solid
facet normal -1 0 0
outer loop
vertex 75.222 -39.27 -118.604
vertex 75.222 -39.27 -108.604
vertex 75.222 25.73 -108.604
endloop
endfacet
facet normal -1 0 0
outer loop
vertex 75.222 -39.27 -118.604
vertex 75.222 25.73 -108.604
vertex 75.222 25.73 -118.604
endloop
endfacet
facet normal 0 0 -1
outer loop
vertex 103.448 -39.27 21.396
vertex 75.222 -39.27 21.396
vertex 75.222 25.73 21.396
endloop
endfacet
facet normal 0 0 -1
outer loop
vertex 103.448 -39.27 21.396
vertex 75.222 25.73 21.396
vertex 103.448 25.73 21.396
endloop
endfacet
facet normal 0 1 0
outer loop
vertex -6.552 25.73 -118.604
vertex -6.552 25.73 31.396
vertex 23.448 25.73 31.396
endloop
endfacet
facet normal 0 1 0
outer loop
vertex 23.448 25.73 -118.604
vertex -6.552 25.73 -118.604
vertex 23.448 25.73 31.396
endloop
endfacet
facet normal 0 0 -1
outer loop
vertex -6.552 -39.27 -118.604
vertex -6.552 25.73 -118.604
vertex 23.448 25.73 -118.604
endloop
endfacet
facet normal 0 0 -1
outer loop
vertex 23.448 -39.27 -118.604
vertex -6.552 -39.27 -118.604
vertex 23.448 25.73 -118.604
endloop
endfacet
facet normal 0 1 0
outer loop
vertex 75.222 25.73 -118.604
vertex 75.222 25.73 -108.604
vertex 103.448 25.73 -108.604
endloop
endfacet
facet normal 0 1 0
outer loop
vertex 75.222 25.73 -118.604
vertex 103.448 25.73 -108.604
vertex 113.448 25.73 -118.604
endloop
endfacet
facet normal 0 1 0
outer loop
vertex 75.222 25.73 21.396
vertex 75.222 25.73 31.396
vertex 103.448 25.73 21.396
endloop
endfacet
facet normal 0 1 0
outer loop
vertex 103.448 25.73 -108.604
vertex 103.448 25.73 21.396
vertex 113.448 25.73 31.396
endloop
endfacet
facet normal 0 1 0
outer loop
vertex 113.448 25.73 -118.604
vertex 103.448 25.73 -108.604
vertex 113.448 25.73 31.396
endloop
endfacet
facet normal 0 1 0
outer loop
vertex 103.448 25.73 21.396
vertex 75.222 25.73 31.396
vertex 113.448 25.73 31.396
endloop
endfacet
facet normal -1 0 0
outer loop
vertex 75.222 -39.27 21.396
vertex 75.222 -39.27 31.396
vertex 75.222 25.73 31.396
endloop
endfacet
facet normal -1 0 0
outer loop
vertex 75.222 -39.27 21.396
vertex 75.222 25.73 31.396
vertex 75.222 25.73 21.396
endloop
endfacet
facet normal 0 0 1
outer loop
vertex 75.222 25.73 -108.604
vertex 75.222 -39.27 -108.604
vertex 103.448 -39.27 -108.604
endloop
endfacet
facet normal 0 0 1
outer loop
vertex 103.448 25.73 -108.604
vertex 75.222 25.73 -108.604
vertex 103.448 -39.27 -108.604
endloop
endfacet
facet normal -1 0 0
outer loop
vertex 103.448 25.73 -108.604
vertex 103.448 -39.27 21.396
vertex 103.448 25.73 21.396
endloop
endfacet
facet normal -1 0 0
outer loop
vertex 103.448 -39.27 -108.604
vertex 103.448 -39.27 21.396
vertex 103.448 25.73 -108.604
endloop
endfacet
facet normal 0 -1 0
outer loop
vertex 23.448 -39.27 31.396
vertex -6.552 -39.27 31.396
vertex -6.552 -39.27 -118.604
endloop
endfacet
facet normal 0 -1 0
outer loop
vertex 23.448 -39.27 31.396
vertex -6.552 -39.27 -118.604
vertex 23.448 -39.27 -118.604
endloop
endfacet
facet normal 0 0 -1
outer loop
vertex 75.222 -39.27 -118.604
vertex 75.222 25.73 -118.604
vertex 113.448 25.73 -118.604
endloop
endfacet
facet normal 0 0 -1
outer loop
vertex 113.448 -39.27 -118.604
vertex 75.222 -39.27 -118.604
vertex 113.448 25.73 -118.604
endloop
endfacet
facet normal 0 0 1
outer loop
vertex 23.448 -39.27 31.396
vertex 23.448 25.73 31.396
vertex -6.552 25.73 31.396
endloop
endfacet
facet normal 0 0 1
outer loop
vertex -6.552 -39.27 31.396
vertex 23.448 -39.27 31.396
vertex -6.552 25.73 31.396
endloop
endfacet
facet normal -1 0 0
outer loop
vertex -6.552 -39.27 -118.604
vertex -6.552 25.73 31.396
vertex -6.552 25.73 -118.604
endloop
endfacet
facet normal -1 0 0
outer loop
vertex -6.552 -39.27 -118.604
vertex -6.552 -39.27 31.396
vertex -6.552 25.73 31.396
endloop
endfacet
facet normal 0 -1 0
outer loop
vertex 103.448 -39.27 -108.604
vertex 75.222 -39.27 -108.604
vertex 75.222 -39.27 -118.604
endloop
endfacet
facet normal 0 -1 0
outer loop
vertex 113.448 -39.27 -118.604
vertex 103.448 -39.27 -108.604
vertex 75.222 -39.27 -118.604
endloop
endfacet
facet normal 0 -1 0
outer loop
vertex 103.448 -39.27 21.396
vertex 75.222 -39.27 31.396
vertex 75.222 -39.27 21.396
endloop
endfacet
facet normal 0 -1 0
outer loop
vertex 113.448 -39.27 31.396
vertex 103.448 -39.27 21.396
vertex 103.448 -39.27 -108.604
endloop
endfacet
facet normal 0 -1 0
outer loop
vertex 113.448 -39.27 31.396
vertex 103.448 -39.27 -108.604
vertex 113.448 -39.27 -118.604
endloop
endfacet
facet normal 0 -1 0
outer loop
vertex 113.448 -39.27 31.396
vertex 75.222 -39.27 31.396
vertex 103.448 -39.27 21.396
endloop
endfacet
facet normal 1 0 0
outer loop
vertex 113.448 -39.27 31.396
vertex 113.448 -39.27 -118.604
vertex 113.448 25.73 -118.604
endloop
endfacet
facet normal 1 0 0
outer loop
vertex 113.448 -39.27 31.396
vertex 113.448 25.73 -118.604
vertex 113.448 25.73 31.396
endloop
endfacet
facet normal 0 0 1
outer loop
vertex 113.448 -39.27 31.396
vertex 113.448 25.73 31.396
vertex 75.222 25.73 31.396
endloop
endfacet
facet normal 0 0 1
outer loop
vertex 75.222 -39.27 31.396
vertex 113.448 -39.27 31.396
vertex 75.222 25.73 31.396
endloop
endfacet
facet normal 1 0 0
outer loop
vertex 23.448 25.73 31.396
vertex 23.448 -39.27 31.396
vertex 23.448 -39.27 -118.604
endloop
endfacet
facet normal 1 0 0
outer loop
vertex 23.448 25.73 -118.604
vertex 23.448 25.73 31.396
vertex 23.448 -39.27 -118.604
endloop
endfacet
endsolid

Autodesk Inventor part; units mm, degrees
ref_plane "YZ Plane" through (0, 0, 0) normal (1, 0, 0) x (0, 1, 0)
ref_plane "XZ Plane" through (0, 0, 0) normal (0, 1, 0) x (-1, 0, 0)
ref_plane "XY Plane" through (0, 0, 0) normal (0, 0, 1) x (1, 0, 0)
ref_plane "Work Plane1" through (53.4484, -39.2696, -18.6043) normal (0, -1, 0) x (1, 0, 0)
sketch "Sketch1" plane through (53.4484, -39.2696, -18.6043) normal (0, -1, 0) x (1, 0, 0)
  line L0 (-60, -100) -> (60, -100)
  line L1 (60, -100) -> (60, 50)
  line L2 (60, 50) -> (-60, 50)
  line L3 (-60, 50) -> (-60, -100)
  line L4 (-60, -100) -> (60, 50) construction
  line L5 (60, -100) -> (-60, 50) construction
  line L6 (60, 50) -> (50, 50)
  line L7 (50, 50) -> (50, -100)
  line L8 (50, -100) -> (60, -100)
  line L9 (60, -100) -> (60, 50)
  line L10 (-60, -100) -> (-50, -100)
  line L11 (-50, -100) -> (-50, 50)
  line L12 (-50, 50) -> (-60, 50)
  line L13 (-60, 50) -> (-60, -100)
  line L14 (-30, 150) -> (-30, -150) projected
  line L15 (21.7735, 150) -> (21.7735, -150) projected
  line L16 (60, 50) -> (21.7735, 50)
  line L17 (21.7735, 50) -> (21.7735, 40)
  line L18 (21.7735, 40) -> (60, 40)
  line L19 (60, 40) -> (60, 50)
  line L20 (60, -100) -> (21.7735, -100)
  line L21 (21.7735, -100) -> (21.7735, -90)
  line L22 (21.7735, -90) -> (60, -90)
  line L23 (60, -90) -> (60, -100)
  line L24 (-60, 50) -> (-30, 50)
  line L25 (-30, 50) -> (-30, 40)
  line L26 (-30, 40) -> (-60, 40)
  line L27 (-60, 40) -> (-60, 50)
  line L28 (-60, -100) -> (-30, -100)
  line L29 (-30, -100) -> (-30, -90)
  line L30 (-60, -40) -> (-60, -100)
  line L31 (-30, 150) -> (-30, -150) projected
  line L32 (-60, -40) -> (-30, -40)
  line L33 (-30, -100) -> (-30, -40)
  line L34 (-30, 50) -> (-30, 40)
  point P0 (-53.4484, 18.6043)
  point P1 (0, -25)
  point P2 (-50, 40)
  point P3 (-30, 50)
  point P4 (50, 40)
  point P5 (50, -90)
  point P6 (21.7735, -100)
  point P7 (21.7735, 50)
  point P8 (0, -25)
  dimension "d0" = 120
  dimension "d1" = 150
  dimension "d2" = 10
  dimension "d3" = 10
  dimension "d4" = 10
  dimension "d5" = 10
  dimension "d6" = 10
  dimension "d7" = 10
  dimension "d13" = 75
  dimension "d14" = 0
extrude "Extrusion1" add sketch "Sketch1" against normal blind 65 contours L3 L32 L11 L0 | L11 L32 L14 L0 | L3 L26 L11 L32 | L11 L26 L14 L32 | L3 L2 L11 L26 | L15 L22 L7 L0 | L11 L2 L14 L26 | L7 L22 L1 L0 | L7 L18 L1 L22 | L15 L2 L7 L18 | L7 L2 L1 L18
sketch "Sketch2" plane through (103.4484, -39.2696, -108.6043) normal (-1, 0, 0) x (0, 0, 1)
  line L0 (0, 65) -> (130, 65) projected
  line L1 (130, 0) -> (130, 65) projected
  line L2 (0, 65) -> (130, 65)
  line L3 (130, 65) -> (130, 55)
  line L4 (130, 55) -> (0, 55)
  line L5 (0, 55) -> (0, 65)
  point P0 (108.6043, 39.2696)
  dimension "d10" = 10
extrude "Extrusion2" [suppressed]
sketch "Sketch3" plane through (53.4484, 25.7304, -18.6043) normal (0, 1, 0) x (1, 0, 0)
  point P0 (-53.4484, -18.6043)
sketch "Sketch4" plane through (53.4484, 25.7304, -18.6043) normal (0, 1, 0) x (1, 0, 0)
  point P0 (-53.4484, -18.6043)
properties part number "end_effector_clamp"
